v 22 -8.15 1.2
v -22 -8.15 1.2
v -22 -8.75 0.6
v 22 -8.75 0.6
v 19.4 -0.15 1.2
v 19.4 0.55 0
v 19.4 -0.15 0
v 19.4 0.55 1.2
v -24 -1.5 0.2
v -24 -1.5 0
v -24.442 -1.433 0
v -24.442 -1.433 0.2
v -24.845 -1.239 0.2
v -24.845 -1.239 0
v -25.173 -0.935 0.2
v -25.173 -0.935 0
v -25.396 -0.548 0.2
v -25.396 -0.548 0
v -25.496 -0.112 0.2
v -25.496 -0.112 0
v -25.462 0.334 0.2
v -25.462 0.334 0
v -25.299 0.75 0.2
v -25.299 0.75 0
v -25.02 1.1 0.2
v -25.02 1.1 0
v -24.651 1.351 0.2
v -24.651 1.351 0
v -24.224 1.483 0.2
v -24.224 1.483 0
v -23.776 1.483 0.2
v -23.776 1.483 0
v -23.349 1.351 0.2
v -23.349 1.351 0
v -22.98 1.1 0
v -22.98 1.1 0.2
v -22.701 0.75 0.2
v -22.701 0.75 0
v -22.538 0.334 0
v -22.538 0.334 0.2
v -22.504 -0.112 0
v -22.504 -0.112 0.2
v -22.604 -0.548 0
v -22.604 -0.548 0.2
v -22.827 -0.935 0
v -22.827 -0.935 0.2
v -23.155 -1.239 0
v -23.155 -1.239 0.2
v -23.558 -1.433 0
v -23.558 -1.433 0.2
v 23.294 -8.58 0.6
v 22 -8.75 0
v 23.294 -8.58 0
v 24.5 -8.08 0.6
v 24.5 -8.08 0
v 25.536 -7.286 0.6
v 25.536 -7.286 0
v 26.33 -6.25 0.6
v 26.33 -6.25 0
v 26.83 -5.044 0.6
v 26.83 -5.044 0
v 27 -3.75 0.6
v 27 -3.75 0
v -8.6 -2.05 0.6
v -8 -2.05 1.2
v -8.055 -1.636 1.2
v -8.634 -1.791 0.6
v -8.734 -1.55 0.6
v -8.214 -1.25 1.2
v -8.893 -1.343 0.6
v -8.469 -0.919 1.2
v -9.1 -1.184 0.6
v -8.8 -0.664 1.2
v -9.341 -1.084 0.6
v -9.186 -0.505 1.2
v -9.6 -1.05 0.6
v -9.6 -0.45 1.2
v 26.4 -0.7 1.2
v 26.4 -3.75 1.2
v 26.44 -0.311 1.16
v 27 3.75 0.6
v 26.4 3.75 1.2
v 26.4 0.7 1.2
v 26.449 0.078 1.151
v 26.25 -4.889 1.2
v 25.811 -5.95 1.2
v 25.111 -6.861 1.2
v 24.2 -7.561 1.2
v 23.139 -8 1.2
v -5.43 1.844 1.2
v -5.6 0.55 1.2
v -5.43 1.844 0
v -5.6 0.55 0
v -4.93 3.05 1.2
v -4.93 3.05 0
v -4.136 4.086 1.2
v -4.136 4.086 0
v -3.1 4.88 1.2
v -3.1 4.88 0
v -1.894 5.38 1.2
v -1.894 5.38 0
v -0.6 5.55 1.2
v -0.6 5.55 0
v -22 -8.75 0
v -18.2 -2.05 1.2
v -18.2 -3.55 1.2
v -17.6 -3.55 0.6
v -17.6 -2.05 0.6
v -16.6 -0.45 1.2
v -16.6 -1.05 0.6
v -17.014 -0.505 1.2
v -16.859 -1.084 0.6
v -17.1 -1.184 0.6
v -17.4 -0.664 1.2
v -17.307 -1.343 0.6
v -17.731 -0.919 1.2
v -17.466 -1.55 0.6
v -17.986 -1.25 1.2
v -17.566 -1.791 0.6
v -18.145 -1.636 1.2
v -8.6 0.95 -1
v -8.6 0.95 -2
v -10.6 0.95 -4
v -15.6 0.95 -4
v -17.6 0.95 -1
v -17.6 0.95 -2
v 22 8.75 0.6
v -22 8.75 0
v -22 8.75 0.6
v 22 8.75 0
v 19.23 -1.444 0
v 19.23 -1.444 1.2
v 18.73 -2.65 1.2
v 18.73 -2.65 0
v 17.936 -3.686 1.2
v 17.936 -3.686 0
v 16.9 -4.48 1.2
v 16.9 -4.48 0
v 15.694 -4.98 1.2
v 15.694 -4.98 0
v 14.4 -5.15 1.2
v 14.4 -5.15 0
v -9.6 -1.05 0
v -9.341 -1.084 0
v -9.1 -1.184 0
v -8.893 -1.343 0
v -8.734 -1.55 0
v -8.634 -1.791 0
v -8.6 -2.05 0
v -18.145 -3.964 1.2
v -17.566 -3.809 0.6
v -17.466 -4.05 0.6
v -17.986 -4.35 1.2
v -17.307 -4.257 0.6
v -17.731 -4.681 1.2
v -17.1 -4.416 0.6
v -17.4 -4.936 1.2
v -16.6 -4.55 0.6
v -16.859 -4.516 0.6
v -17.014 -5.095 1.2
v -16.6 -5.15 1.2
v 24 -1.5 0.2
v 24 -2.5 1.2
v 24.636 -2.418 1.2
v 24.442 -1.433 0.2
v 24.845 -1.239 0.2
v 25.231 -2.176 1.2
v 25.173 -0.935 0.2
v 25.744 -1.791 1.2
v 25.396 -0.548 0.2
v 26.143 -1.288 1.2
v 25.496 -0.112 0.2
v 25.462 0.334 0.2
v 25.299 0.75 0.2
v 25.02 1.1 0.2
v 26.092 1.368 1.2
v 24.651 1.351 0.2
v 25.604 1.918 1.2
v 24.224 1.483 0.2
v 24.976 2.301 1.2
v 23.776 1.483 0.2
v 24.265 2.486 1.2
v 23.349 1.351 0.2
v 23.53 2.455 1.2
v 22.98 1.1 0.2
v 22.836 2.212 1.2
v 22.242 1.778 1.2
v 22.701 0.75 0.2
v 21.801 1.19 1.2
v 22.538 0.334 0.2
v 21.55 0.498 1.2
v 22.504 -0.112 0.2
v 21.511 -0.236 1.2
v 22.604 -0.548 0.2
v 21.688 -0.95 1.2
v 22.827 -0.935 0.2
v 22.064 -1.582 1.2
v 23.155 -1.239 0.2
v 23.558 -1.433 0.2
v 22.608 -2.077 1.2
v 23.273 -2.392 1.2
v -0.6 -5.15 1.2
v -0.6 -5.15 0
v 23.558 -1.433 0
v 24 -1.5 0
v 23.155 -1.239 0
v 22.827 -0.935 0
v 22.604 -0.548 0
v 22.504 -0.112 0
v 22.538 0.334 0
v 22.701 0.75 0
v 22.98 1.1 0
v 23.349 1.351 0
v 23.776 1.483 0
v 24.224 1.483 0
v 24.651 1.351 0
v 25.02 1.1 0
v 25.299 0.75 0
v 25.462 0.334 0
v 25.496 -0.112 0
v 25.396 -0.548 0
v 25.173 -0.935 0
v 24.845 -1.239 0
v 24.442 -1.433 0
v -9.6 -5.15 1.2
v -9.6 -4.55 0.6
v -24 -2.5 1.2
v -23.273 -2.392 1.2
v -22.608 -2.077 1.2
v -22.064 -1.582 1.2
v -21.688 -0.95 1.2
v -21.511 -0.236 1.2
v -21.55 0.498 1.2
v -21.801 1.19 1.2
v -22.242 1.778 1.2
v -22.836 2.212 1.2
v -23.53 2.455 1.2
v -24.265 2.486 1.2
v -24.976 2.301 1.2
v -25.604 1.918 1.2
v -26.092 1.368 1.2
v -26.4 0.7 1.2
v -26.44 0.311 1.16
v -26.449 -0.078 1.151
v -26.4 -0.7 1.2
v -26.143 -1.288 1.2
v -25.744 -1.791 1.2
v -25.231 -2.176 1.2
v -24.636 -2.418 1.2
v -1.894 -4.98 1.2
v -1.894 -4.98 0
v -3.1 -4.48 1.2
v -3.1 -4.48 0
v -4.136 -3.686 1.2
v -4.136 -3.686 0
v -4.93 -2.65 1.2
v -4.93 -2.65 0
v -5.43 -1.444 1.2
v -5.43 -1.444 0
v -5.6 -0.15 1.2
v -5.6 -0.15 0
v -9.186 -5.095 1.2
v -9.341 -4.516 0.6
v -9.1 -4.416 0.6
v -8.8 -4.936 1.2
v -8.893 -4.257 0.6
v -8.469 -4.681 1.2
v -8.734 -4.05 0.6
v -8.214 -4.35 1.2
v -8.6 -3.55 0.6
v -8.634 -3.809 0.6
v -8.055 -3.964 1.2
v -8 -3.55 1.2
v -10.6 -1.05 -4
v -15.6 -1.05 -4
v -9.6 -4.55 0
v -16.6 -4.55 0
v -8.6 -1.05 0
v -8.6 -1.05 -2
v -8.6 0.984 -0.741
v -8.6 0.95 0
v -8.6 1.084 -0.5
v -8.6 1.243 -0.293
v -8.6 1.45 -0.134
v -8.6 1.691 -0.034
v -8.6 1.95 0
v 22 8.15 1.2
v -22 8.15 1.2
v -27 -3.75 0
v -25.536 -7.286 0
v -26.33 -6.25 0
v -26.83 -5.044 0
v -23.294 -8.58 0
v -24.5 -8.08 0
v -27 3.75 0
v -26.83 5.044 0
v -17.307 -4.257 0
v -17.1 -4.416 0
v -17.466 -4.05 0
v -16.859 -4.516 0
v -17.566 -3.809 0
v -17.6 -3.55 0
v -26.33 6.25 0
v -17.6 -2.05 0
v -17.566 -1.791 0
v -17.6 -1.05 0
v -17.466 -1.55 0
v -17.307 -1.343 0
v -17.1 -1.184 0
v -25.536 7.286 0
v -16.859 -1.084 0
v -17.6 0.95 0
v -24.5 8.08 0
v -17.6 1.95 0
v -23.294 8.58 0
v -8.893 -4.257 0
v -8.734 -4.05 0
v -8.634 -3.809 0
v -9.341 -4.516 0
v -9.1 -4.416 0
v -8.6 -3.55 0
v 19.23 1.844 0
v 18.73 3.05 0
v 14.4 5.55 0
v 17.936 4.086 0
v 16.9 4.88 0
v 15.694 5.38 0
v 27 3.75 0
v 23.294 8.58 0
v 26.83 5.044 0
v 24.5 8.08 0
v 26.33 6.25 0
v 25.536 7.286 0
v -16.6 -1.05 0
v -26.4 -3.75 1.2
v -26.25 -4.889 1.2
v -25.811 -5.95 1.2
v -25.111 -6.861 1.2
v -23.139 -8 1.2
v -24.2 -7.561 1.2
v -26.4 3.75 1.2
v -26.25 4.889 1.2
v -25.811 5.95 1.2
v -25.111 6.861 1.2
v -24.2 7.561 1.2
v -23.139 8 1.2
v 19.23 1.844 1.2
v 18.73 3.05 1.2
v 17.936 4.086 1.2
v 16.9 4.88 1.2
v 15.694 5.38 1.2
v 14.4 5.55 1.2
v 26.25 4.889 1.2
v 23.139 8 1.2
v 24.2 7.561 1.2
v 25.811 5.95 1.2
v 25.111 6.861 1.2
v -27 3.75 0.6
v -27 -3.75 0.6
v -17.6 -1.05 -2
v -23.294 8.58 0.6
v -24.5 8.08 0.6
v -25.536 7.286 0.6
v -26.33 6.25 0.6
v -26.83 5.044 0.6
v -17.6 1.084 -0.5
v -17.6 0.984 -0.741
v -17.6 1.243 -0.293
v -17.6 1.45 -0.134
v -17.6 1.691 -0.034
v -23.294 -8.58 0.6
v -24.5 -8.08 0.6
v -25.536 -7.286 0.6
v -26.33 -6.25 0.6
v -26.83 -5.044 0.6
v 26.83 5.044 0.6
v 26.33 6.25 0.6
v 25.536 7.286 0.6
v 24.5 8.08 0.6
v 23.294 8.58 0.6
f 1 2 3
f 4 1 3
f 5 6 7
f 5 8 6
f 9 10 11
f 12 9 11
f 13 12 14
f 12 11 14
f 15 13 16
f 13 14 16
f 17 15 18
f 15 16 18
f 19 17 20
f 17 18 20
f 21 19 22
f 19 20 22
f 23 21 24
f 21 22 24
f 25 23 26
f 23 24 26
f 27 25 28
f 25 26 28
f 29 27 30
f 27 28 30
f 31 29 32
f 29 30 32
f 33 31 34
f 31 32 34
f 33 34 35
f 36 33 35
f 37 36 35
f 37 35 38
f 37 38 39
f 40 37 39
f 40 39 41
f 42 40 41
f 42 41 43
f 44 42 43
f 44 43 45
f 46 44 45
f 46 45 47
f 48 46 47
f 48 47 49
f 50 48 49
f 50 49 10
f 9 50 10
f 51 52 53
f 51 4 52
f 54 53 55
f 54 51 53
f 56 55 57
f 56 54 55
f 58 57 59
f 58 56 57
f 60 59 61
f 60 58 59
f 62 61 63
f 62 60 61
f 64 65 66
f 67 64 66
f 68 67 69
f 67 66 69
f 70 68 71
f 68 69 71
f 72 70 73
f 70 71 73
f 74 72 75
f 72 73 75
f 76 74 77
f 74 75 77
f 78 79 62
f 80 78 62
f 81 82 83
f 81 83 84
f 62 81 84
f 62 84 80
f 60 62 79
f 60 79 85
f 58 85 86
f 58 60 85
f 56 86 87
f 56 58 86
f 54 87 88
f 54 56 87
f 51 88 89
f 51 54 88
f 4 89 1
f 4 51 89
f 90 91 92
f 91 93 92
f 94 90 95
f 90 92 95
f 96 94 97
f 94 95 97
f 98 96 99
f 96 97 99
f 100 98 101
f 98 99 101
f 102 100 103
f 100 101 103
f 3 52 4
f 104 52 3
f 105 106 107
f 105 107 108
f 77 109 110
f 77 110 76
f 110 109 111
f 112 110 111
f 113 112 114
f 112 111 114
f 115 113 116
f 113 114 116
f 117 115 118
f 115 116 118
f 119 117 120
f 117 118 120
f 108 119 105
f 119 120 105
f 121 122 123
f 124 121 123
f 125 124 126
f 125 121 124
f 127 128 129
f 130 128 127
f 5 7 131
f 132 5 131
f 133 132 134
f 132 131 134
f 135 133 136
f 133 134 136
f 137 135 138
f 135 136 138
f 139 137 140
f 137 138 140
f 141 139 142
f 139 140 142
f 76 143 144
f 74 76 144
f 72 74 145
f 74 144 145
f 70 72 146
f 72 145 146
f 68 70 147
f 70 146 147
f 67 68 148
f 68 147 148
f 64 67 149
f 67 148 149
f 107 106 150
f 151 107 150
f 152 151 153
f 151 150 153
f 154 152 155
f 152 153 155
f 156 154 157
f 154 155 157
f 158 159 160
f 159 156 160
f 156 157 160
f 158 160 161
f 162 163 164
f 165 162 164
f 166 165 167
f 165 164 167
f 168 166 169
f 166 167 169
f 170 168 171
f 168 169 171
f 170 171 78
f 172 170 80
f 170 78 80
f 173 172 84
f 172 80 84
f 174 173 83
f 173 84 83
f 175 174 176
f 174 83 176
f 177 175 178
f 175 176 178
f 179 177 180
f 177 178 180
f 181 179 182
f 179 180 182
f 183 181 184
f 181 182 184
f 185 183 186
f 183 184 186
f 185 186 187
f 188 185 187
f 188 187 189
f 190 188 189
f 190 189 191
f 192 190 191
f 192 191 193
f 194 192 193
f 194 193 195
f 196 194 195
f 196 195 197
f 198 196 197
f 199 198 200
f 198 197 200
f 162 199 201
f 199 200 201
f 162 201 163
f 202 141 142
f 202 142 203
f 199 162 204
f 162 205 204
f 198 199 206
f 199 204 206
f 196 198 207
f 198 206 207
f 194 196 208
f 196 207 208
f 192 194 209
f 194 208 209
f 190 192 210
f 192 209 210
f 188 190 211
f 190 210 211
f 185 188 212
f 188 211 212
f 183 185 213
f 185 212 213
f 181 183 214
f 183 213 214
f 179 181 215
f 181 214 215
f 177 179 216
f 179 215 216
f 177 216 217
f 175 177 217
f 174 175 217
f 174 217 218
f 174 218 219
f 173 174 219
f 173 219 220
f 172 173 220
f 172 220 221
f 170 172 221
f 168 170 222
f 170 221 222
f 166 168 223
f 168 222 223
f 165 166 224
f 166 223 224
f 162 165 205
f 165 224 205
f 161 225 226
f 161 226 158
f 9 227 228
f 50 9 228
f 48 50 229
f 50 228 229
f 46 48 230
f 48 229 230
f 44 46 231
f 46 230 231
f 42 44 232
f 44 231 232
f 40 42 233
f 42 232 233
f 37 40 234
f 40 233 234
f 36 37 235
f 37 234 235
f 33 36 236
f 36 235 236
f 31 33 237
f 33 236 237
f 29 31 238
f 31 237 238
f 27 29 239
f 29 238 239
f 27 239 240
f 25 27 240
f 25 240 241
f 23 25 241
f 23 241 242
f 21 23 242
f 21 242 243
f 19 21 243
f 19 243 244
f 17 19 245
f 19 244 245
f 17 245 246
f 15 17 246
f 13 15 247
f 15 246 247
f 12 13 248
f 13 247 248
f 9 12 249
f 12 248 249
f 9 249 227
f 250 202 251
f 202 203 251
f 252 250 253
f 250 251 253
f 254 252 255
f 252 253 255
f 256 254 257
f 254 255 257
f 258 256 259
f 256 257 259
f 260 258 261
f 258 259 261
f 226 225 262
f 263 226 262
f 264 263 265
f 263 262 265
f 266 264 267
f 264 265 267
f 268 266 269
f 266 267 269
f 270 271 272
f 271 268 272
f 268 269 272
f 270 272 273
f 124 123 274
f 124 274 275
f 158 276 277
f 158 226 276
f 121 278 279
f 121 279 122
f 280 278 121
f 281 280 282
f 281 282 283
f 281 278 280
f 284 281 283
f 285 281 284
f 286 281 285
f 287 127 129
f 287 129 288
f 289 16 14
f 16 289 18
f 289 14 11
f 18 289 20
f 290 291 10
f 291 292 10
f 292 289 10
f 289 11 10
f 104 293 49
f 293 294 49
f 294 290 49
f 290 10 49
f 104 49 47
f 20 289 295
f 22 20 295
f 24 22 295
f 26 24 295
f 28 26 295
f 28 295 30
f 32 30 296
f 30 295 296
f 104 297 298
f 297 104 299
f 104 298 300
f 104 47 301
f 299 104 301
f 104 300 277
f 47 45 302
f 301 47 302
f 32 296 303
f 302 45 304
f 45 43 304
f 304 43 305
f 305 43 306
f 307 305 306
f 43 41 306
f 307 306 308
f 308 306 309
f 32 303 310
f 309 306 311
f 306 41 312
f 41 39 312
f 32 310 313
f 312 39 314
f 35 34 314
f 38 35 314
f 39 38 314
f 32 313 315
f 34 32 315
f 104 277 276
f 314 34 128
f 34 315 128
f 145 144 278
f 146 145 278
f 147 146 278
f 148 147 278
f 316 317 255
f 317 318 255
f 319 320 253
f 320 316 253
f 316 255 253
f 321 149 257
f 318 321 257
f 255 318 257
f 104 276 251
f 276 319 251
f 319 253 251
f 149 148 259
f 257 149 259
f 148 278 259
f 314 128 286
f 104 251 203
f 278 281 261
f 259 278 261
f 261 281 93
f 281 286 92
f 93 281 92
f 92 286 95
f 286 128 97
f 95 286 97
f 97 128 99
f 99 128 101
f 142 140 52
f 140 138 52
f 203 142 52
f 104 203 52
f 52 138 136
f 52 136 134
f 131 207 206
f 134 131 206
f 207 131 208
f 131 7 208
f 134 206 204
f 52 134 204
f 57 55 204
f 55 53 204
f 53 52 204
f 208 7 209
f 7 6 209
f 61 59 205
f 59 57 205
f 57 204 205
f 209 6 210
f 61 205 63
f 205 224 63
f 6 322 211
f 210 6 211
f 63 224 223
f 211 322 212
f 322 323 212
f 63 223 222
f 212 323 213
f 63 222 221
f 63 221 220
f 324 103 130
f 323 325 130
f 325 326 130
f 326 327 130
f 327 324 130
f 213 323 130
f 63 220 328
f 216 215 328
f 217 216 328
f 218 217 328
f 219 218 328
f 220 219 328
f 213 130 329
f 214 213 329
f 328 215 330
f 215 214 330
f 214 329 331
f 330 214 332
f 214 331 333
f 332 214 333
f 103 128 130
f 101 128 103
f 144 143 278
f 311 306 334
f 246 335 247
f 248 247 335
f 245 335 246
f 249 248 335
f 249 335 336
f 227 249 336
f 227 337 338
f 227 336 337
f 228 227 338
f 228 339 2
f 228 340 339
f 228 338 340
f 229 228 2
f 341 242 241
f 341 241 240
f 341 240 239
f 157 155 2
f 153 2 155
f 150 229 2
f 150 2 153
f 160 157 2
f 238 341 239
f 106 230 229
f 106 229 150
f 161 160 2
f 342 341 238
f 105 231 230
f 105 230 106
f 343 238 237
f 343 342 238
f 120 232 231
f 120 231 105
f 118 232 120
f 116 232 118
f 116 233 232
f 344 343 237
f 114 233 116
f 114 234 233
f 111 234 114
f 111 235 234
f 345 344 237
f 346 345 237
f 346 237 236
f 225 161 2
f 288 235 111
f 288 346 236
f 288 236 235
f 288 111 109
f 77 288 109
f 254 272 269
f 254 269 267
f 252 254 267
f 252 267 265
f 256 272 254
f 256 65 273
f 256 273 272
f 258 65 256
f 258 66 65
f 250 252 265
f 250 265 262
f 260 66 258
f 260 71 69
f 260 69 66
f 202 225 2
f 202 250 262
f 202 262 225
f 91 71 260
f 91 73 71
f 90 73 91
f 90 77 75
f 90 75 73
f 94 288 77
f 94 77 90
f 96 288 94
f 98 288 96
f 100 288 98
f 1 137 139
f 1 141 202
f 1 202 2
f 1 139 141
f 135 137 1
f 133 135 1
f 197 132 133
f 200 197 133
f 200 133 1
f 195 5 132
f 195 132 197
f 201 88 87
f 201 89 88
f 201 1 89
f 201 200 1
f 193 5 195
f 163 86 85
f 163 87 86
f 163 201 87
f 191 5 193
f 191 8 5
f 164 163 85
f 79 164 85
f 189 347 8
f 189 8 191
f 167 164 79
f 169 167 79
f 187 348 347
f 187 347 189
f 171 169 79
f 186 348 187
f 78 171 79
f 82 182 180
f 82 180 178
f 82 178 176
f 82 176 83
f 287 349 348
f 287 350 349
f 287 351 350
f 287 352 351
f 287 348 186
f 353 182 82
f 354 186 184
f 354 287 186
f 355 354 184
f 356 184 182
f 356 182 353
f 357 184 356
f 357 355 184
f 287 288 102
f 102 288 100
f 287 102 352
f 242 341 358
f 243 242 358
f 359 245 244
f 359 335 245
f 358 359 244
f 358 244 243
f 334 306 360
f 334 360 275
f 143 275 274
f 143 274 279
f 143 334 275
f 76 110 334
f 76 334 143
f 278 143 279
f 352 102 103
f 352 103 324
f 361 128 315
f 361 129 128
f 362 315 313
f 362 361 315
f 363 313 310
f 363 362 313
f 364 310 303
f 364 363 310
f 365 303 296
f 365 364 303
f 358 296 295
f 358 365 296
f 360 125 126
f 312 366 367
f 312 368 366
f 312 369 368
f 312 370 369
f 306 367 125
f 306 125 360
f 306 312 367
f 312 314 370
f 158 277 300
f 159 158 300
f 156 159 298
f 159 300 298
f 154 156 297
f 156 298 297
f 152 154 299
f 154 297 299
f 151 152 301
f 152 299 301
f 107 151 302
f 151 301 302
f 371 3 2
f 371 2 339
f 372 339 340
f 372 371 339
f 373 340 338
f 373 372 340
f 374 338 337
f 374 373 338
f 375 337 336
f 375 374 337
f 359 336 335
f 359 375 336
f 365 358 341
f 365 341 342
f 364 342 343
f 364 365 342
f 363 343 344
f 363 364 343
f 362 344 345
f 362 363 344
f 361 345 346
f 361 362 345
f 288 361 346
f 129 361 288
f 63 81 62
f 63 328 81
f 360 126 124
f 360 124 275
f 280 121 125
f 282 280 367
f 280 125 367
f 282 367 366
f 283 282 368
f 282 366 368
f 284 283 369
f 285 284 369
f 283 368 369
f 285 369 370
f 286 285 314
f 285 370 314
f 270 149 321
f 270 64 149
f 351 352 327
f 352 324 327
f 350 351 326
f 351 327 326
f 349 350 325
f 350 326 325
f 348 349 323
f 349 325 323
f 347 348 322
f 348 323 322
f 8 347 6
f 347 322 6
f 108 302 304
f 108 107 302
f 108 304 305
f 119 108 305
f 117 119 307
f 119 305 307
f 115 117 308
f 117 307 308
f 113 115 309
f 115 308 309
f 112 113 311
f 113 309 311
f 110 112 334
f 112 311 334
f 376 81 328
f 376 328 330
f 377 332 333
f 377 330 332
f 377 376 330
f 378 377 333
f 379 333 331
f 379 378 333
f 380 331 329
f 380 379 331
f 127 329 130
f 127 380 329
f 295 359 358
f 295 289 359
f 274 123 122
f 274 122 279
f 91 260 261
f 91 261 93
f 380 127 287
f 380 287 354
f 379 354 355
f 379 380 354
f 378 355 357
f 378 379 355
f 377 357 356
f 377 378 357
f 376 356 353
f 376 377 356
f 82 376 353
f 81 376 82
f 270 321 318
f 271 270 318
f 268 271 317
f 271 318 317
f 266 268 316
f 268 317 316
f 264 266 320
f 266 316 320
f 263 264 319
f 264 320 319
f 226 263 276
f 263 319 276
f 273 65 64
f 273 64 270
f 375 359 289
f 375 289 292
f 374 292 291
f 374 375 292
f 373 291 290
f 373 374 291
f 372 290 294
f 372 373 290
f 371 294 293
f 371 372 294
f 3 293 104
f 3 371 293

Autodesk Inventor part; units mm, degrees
ref_plane "YZ Plane" through (0, 0, 0) normal (1, 0, 0) x (0, 1, 0)
ref_plane "XZ Plane" through (0, 0, 0) normal (0, 1, 0) x (-1, 0, 0)
ref_plane "XY Plane" through (0, 0, 0) normal (0, 0, 1) x (1, 0, 0)
sketch "Sketch1" plane through (0, 0, 0) normal (0, 0, 1) x (1, 0, 0)
  line L0 (-27, 8.75) -> (27, 8.75)
  line L1 (27, 8.75) -> (27, -8.75)
  line L2 (27, -8.75) -> (-27, -8.75)
  line L3 (-27, -8.75) -> (-27, 8.75)
  point P0 (0, 0)
  dimension "d0" = 17.5
  dimension "d1" = 54
  dimension "d2" = 8.75
  dimension "d3" = 27
extrude "Extrusion1" add sketch "Sketch1" along normal blind 1.2
fillet "Fillet1" radius 5 4 edges at (-27, 8.75, 0.6) (-27, -8.75, 0.6) (27, 8.75, 0.6) (27, -8.75, 0.6)
sketch "Sketch2" plane through (0, 0, 1.2) normal (0, 0, 1) x (1, 0, 0)
  line L0 (-22, -8.75) -> (22, -8.75) projected
  line L1 (-27, 3.75) -> (-27, -3.75) projected
  line L2 (27, -3.75) -> (27, 3.75) projected
  point P0 (0, 0)
  point P1 (-24, 0)
  point P2 (24, 0)
  dimension "d7" = 8.75
  dimension "d8" = 8.75
  dimension "d9" = 3
  dimension "d10" = 3
hole "Hole1" at (-24, 0, 1.2) at (24, 0, 1.2) direction (0, 0, -1) diameter 3 depth 8.8 tip angle 118 countersink diameter 5 countersink angle 90
chamfer "Chamfer1" distance 0.6 angle 45 8 edges at (0, 8.75, 1.2) (-25.5355, 7.2855, 1.2) (-27, 0, 1.2) (-25.5355, -7.2855, 1.2) (0, -8.75, 1.2) (25.5355, -7.2855, 1.2) (27, 0, 1.2) (25.5355, 7.2855, 1.2)
sketch "Sketch3" plane through (0, 0, 1.2) normal (0, 0, 1) x (1, 0, 0)
  line L0 (-21, 6.75) -> (21, 6.75)
  line L1 (21, 6.75) -> (21, -6.75)
  line L2 (21, -6.75) -> (-21, -6.75)
  line L3 (-21, -6.75) -> (-21, 6.75)
  line L4 (22, 8.75) -> (-22, 8.75) projected
  line L5 (-22, -8.75) -> (22, -8.75) projected
  line L6 (-27, 3.75) -> (-27, -3.75) projected
  line L7 (27, -3.75) -> (27, 3.75) projected
  line L8 (-17.6, -1.05) -> (-8.6, -1.05)
  line L9 (-8.6, -1.05) -> (-8.6, -4.55)
  line L10 (-8.6, -4.55) -> (-17.6, -4.55)
  line L11 (-17.6, -4.55) -> (-17.6, -1.05)
  point P0 (0, 0)
  dimension "d21" = 2
  dimension "d22" = 2
  dimension "d23" = 6
  dimension "d24" = 6
  dimension "d25" = 3.4
  dimension "d26" = 9
  dimension "d27" = 3.5
  dimension "d28" = 2.2
extrude "Extrusion2" cut sketch "Sketch3" against normal blind 1.2 contours L8 L9 L10 L11
sketch "Sketch4" plane through (0, 0, 1.2) normal (0, 0, 1) x (1, 0, 0)
  line L0 (-5.6, 5.55) -> (19.4, 5.55)
  line L1 (19.4, 5.55) -> (19.4, -5.15)
  line L2 (19.4, -5.15) -> (-5.6, -5.15)
  line L3 (-5.6, -5.15) -> (-5.6, 5.55)
  line L4 (22, 8.75) -> (-22, 8.75) projected
  line L5 (-27, 3.75) -> (-27, -3.75) projected
  line L6 (-8.6, -4.55) -> (-17.6, -4.55) projected
  point P0 (0, 0)
  dimension "d31" = 25
  dimension "d32" = 10.7
  dimension "d34" = 21.4
  dimension "d35" = 3.2
  dimension "d36" = 0.6
extrude "Extrusion3" cut sketch "Sketch4" against normal blind 1.2
fillet "Fillet2" radius 5 4 edges at (-5.6, 5.55, 0.6) (-5.6, -5.15, 0.6) (19.4, 5.55, 0.6) (19.4, -5.15, 0.6)
fillet "Fillet3" radius 1 4 edges at (-8.6, -1.05, 0.6) (-17.6, -1.05, 0.6) (-17.6, -4.55, 0.6) (-8.6, -4.55, 0.6)
sketch "Sketch5" plane through (0, 0, 0) normal (0, 0, -1) x (-1, 0, 0)
  line L0 (8.6, 0.95) -> (17.6, 0.95)
  line L1 (17.6, 0.95) -> (17.6, -1.05)
  line L2 (17.6, -1.05) -> (8.6, -1.05)
  line L3 (8.6, -1.05) -> (8.6, 0.95)
  line L4 (9.6, -1.05) -> (16.6, -1.05) projected
  line L5 (8.6, -3.55) -> (8.6, -2.05) projected
  line L6 (17.6, -2.05) -> (17.6, -3.55) projected
  point P0 (0, 0)
  dimension "d47" = 2
extrude "Extrusion4" add sketch "Sketch5" along normal blind 4
fillet "Fillet4" radius 1 1 edges at (-13.1, 0.95, 0)
chamfer "Chamfer4" distance 2 angle 45 2 edges at (-8.6, -0.05, -4) (-17.6, -0.05, -4)
chamfer "Chamfer6" distance 0.6 angle 45 8 edges at (-13.1, -1.05, 1.2) (-8.8929, -1.3429, 1.2) (-8.6, -2.8, 1.2) (-8.8929, -4.2571, 1.2) (-13.1, -4.55, 1.2) (-17.3071, -4.2571, 1.2) (-17.6, -2.8, 1.2) (-17.3071, -1.3429, 1.2)
properties part number "cover"
